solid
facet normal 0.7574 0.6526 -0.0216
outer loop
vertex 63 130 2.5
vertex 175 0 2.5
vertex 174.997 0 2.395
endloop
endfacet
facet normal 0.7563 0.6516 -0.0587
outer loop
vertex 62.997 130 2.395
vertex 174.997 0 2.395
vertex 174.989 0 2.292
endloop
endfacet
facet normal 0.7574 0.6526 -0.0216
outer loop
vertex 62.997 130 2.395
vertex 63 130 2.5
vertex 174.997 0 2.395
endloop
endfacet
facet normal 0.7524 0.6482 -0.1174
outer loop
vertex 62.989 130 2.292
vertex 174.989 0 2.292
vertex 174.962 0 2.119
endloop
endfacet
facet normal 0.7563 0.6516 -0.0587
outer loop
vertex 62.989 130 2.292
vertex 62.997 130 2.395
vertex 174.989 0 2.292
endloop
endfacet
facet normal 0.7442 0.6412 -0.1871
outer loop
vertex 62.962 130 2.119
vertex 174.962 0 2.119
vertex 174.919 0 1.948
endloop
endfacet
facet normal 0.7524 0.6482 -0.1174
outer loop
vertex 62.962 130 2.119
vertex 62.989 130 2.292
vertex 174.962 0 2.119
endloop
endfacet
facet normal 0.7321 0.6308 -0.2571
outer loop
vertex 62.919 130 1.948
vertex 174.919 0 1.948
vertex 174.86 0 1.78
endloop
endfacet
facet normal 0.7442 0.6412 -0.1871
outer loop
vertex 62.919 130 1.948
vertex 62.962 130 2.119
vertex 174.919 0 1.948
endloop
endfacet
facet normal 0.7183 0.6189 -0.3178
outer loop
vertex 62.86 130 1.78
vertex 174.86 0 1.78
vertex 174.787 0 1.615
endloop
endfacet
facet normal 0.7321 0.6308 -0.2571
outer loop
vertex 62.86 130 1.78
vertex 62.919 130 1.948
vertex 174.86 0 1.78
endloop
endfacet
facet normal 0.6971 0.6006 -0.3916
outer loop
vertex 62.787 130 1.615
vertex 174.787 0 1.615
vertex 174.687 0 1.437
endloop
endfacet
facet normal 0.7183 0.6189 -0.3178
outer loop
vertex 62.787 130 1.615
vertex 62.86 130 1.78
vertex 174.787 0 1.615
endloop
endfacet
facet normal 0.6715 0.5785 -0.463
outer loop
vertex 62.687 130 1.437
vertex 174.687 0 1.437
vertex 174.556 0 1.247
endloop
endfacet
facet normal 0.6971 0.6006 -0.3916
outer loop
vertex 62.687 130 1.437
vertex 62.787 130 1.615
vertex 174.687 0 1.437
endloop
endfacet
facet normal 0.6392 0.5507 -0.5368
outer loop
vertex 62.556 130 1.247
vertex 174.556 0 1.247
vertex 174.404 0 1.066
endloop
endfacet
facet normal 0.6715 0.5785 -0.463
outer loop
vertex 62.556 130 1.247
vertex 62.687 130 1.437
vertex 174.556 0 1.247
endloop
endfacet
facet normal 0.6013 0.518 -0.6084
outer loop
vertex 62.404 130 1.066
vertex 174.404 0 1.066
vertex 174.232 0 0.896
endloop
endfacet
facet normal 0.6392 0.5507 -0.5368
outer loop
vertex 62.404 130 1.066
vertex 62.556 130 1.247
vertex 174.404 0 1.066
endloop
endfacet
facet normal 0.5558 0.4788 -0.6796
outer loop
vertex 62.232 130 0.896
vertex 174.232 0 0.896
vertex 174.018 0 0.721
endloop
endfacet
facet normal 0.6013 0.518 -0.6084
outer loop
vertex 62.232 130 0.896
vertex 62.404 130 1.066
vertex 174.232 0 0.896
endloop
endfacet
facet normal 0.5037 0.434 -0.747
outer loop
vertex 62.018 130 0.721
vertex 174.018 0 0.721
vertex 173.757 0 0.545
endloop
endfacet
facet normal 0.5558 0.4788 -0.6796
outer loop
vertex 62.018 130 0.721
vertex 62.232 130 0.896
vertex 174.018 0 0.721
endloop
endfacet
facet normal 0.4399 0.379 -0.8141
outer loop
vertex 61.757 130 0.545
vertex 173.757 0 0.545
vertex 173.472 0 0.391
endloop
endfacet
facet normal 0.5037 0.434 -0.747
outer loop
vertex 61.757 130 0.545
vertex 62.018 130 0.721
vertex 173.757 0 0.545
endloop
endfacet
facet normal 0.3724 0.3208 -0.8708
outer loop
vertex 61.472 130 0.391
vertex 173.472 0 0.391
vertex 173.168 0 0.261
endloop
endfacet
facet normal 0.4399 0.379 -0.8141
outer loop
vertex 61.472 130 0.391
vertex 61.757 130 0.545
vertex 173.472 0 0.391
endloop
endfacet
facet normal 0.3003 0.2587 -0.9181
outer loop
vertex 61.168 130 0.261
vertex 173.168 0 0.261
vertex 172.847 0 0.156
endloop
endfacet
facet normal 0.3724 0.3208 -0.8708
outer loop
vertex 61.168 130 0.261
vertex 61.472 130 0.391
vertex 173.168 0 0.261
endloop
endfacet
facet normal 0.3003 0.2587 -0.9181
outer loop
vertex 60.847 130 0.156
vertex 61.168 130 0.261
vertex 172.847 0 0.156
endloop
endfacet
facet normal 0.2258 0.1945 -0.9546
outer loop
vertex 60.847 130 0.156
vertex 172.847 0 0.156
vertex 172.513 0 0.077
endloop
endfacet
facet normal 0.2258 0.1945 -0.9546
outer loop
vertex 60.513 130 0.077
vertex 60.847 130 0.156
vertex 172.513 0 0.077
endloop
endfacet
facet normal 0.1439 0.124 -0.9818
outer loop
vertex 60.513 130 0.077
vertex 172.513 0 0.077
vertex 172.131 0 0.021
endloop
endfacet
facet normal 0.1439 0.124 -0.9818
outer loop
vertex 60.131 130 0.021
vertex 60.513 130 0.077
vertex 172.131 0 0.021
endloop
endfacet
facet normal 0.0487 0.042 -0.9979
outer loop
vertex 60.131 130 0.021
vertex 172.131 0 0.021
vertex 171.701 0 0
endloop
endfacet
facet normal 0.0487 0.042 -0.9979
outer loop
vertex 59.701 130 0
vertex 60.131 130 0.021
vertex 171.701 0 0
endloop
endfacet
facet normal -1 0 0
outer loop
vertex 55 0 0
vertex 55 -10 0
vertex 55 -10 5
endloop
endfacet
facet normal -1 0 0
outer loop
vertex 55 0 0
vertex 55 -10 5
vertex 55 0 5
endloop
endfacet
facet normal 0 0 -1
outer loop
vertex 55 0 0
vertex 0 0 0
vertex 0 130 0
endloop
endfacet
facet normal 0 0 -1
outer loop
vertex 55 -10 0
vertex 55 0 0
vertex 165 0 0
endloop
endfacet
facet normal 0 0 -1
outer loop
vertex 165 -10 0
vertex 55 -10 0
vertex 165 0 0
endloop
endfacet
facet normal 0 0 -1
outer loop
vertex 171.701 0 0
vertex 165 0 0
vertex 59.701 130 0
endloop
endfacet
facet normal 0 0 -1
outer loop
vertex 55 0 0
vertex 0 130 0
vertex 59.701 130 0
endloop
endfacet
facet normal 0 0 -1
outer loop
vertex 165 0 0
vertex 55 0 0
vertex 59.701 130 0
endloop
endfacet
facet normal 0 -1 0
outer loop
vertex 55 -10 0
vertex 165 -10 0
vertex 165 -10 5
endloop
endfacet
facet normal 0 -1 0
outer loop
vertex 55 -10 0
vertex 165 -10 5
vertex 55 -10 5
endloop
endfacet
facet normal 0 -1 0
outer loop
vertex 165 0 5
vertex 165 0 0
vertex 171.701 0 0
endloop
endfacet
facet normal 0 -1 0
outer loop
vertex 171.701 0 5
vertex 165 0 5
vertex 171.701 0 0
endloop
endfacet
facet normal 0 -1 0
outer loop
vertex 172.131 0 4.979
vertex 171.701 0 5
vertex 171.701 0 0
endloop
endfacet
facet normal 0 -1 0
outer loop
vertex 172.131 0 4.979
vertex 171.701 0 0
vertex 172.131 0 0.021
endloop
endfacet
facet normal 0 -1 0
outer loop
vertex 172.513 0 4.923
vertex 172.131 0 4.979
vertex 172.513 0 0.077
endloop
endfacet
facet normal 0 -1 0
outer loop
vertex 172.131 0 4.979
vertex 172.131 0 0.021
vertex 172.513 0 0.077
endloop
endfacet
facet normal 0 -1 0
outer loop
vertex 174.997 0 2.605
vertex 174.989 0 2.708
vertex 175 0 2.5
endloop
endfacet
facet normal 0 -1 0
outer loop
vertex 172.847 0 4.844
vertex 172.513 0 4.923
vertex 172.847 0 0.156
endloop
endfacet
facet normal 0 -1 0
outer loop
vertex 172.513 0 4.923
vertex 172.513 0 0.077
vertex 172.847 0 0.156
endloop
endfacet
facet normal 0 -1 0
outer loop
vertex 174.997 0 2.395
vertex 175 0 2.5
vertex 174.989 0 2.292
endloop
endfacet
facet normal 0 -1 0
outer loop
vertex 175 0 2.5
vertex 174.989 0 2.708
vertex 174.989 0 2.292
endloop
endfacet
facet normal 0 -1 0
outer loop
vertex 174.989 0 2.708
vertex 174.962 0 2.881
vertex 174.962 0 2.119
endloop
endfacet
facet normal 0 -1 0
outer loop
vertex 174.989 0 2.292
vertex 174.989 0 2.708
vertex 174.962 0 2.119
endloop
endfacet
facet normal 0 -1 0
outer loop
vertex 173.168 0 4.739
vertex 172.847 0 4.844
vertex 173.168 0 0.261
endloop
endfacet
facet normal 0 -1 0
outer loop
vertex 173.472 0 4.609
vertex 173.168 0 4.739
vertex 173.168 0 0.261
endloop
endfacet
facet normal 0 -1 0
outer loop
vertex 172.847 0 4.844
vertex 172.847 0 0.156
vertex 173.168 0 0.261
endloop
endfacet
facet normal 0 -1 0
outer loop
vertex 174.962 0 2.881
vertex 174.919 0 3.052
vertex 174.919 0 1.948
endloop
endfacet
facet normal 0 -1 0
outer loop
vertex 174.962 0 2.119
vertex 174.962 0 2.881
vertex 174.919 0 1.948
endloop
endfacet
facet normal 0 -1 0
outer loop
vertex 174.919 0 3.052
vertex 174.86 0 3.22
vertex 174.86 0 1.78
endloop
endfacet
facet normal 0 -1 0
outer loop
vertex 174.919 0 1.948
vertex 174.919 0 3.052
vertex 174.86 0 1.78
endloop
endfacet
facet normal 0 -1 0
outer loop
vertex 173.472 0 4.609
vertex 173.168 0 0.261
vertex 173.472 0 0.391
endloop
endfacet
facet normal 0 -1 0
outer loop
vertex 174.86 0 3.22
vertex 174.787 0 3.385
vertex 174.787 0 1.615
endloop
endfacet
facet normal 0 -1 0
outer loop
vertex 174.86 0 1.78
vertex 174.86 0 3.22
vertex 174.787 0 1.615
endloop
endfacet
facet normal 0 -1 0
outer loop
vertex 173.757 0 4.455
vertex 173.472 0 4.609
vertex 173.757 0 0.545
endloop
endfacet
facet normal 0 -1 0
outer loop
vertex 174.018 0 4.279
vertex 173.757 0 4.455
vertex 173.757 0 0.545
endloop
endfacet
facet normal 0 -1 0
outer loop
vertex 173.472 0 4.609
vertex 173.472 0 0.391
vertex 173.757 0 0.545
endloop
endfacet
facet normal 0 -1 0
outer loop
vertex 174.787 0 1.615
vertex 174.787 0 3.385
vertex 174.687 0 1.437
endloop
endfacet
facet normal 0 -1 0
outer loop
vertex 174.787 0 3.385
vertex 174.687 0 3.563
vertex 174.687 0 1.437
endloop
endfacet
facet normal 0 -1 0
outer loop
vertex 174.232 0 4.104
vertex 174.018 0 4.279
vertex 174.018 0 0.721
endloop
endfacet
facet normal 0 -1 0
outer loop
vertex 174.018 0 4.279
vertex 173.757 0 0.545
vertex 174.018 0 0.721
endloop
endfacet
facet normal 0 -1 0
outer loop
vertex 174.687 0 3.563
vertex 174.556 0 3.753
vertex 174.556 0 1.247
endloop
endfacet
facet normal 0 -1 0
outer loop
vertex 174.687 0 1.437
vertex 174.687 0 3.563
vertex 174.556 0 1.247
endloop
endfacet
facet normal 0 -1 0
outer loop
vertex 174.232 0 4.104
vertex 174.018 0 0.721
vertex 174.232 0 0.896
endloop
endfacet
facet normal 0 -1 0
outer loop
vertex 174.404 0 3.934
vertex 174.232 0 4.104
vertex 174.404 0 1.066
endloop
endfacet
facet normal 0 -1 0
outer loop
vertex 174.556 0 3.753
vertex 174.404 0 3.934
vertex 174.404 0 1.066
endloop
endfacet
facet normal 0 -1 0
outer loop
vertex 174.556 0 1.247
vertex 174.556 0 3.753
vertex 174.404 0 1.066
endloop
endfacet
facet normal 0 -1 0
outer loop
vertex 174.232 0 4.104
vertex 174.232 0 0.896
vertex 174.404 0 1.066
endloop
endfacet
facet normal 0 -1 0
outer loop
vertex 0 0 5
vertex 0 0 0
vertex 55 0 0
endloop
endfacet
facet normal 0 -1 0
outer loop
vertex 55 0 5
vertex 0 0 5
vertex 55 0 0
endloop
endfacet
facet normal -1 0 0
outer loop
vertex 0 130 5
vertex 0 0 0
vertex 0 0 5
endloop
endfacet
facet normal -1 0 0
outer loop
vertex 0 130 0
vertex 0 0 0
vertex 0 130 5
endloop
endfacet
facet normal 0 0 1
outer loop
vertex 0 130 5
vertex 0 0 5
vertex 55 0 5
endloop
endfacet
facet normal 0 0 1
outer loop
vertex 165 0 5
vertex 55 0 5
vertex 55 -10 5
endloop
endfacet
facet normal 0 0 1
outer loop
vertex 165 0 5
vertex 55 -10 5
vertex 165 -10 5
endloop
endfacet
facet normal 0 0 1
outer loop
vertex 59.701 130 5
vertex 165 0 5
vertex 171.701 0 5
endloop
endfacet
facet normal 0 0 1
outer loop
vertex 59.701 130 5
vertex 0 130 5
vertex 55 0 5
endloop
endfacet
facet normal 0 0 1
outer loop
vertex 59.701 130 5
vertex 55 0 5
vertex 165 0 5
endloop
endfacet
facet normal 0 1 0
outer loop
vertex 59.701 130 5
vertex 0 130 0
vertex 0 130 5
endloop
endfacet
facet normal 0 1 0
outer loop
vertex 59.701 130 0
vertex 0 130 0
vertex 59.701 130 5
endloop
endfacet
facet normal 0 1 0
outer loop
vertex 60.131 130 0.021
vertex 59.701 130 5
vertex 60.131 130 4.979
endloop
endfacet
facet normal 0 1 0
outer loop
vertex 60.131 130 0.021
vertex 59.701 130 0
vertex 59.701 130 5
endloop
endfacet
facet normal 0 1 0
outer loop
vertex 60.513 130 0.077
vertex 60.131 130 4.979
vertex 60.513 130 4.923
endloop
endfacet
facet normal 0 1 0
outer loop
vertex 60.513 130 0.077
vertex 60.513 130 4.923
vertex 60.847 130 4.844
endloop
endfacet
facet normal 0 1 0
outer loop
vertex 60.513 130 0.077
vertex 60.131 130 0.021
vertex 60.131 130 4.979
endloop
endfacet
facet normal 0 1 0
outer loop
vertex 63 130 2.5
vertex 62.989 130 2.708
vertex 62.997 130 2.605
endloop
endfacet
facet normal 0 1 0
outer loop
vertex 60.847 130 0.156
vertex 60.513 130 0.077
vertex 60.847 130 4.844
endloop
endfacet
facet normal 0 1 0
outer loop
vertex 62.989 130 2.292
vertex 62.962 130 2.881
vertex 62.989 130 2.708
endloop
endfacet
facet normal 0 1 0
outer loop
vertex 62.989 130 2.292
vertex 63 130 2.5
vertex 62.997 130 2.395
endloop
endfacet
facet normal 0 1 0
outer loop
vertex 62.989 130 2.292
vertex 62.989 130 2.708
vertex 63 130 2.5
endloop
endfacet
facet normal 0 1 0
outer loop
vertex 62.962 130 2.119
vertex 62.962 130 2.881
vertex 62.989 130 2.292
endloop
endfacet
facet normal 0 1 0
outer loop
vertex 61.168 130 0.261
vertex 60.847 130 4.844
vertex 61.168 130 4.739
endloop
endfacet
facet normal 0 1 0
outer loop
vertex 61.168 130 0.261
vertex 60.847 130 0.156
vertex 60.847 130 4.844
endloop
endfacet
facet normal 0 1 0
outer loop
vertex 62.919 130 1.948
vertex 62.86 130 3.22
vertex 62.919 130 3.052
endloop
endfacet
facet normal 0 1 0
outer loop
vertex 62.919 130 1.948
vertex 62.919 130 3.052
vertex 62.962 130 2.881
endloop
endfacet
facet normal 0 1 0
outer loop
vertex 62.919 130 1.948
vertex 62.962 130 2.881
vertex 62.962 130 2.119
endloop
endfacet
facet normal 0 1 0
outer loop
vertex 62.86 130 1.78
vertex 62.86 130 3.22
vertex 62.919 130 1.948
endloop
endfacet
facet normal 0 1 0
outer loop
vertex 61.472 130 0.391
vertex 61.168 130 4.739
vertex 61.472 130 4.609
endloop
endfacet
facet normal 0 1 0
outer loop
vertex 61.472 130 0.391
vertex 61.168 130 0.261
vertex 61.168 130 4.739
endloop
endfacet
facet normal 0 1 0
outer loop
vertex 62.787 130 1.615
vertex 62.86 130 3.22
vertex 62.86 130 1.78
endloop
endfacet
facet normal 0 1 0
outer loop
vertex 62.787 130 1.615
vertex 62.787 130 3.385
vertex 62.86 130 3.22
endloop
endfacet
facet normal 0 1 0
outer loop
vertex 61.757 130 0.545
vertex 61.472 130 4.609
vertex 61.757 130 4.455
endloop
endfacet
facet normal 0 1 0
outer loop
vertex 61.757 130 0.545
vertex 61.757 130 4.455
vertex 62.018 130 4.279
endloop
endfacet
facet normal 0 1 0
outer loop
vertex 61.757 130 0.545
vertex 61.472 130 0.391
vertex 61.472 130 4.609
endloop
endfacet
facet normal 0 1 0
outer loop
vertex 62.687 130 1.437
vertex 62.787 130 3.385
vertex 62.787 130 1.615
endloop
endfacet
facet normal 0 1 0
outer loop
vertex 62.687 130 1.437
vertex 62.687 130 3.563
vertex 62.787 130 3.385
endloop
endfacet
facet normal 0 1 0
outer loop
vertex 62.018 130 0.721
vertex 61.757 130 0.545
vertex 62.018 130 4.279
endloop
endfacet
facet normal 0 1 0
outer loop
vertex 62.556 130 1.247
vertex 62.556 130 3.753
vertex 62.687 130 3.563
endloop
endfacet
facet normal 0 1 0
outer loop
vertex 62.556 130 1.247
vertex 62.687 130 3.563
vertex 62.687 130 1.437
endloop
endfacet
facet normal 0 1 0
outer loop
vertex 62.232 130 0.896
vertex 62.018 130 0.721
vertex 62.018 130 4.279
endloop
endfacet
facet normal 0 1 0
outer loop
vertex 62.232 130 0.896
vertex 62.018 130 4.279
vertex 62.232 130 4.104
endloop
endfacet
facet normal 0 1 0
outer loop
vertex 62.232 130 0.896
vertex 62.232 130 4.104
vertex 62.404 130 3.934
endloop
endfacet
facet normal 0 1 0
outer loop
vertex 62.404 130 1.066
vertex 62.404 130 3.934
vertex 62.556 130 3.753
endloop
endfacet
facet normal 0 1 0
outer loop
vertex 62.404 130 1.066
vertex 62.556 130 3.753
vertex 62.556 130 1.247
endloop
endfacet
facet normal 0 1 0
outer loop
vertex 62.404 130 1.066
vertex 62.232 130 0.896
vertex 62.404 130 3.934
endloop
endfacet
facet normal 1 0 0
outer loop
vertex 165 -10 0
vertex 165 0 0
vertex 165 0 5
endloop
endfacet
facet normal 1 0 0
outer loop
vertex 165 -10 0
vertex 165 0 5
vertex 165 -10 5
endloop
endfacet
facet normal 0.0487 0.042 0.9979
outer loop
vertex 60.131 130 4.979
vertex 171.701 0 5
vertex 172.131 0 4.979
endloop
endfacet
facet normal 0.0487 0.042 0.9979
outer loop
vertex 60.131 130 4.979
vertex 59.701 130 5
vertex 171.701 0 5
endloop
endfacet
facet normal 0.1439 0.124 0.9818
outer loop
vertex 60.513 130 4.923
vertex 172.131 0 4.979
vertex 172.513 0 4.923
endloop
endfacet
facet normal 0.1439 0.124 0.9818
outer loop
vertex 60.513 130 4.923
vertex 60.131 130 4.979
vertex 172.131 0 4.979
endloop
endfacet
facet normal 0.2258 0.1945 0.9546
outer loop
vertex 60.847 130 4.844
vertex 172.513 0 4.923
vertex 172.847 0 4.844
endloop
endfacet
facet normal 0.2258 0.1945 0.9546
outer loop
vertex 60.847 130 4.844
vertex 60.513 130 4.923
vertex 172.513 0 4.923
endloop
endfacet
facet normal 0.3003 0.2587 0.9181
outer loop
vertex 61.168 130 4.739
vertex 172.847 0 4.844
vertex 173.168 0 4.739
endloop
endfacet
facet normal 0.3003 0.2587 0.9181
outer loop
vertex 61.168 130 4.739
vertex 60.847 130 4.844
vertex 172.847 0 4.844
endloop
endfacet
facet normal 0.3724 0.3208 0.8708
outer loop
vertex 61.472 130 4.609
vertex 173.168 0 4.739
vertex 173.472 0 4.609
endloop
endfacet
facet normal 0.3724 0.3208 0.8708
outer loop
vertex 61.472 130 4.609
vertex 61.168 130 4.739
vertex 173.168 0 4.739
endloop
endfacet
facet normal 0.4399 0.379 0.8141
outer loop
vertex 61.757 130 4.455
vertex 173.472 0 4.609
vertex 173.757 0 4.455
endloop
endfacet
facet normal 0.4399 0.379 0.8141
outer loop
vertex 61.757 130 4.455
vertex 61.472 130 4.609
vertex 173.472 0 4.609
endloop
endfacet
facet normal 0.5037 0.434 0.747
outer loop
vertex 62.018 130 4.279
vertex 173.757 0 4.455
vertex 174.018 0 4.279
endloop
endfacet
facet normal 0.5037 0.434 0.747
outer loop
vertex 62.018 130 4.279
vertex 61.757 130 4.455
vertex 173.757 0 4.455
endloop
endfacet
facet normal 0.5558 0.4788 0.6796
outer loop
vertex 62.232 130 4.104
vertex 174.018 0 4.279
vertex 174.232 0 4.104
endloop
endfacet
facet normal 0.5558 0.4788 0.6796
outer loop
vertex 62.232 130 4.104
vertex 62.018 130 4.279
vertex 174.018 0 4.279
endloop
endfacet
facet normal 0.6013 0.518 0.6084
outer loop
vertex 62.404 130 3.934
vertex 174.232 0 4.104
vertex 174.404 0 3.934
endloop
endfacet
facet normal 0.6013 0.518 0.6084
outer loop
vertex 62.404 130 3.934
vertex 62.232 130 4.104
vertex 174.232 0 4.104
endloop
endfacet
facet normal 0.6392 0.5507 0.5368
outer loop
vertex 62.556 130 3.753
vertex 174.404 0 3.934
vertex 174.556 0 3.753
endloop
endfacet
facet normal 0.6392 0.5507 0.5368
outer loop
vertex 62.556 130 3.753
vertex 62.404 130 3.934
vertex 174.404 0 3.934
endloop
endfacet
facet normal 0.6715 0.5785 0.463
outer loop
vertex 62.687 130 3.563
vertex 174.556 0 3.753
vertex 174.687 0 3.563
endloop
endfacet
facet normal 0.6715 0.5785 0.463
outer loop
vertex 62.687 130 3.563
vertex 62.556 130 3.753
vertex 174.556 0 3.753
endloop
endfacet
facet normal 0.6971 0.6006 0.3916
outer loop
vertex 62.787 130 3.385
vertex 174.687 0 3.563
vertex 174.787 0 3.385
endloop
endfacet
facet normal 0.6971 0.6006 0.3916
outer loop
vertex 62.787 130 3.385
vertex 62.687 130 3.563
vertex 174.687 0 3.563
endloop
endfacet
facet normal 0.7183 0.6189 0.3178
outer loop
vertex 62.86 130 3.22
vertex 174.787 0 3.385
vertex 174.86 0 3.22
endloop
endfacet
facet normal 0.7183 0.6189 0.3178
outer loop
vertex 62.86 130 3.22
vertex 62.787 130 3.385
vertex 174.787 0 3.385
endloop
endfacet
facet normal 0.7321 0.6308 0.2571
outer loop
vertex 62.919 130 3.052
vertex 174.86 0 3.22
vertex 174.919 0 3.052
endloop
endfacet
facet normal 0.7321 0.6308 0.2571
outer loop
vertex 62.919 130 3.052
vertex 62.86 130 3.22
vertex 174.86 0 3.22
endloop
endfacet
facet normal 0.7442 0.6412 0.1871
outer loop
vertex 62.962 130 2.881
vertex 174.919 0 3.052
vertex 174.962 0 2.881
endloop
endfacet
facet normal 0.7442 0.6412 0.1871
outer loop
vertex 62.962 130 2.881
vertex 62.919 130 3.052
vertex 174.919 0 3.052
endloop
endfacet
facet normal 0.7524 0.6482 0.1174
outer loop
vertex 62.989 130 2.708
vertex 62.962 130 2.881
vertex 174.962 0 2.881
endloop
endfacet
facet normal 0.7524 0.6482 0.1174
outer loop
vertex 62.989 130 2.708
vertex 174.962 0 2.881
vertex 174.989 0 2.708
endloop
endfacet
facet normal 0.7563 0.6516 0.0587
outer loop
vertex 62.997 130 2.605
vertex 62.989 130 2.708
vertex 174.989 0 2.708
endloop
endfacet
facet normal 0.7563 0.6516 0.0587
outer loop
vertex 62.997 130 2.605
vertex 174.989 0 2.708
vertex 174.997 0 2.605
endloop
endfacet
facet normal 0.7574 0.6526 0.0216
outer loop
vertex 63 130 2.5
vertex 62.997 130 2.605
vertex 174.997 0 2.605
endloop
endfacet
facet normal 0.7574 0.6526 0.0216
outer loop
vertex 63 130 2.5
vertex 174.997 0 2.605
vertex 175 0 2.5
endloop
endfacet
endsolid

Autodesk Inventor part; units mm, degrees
ref_plane "YZ Plane" through (0, 0, 0) normal (1, 0, 0) x (0, 1, 0)
ref_plane "XZ Plane" through (0, 0, 0) normal (0, 1, 0) x (-1, 0, 0)
ref_plane "XY Plane" through (0, 0, 0) normal (0, 0, 1) x (1, 0, 0)
sketch "Sketch1" plane through (0, 0, 0) normal (0, 0, 1) x (1, 0, 0)
  line L0 (0, 0) -> (0, 110)
  line L1 (18, 130) -> (63, 130)
  line L2 (0, 0) -> (175, 0)
  line L3 (175, 0) -> (63, 130)
  line L4 (165, 0) -> (165, -10)
  line L5 (165, -10) -> (55, -10)
  line L6 (55, -10) -> (55, 0)
  line L7 (0, 110) -> (0, 130)
  line L8 (0, 130) -> (18, 130)
  dimension "d1" = 110
  dimension "d5" = 45
  dimension "d6" = 175
  dimension "d7" = 10
  dimension "d8" = 10
  dimension "d9" = 110
extrude "Extrusion1" add sketch "Sketch1" along normal blind 5
fillet "Fillet1" radius 2.5 2 edges at (119, 65, 5) (119, 65, 0)
properties part number "vertikal stab"
